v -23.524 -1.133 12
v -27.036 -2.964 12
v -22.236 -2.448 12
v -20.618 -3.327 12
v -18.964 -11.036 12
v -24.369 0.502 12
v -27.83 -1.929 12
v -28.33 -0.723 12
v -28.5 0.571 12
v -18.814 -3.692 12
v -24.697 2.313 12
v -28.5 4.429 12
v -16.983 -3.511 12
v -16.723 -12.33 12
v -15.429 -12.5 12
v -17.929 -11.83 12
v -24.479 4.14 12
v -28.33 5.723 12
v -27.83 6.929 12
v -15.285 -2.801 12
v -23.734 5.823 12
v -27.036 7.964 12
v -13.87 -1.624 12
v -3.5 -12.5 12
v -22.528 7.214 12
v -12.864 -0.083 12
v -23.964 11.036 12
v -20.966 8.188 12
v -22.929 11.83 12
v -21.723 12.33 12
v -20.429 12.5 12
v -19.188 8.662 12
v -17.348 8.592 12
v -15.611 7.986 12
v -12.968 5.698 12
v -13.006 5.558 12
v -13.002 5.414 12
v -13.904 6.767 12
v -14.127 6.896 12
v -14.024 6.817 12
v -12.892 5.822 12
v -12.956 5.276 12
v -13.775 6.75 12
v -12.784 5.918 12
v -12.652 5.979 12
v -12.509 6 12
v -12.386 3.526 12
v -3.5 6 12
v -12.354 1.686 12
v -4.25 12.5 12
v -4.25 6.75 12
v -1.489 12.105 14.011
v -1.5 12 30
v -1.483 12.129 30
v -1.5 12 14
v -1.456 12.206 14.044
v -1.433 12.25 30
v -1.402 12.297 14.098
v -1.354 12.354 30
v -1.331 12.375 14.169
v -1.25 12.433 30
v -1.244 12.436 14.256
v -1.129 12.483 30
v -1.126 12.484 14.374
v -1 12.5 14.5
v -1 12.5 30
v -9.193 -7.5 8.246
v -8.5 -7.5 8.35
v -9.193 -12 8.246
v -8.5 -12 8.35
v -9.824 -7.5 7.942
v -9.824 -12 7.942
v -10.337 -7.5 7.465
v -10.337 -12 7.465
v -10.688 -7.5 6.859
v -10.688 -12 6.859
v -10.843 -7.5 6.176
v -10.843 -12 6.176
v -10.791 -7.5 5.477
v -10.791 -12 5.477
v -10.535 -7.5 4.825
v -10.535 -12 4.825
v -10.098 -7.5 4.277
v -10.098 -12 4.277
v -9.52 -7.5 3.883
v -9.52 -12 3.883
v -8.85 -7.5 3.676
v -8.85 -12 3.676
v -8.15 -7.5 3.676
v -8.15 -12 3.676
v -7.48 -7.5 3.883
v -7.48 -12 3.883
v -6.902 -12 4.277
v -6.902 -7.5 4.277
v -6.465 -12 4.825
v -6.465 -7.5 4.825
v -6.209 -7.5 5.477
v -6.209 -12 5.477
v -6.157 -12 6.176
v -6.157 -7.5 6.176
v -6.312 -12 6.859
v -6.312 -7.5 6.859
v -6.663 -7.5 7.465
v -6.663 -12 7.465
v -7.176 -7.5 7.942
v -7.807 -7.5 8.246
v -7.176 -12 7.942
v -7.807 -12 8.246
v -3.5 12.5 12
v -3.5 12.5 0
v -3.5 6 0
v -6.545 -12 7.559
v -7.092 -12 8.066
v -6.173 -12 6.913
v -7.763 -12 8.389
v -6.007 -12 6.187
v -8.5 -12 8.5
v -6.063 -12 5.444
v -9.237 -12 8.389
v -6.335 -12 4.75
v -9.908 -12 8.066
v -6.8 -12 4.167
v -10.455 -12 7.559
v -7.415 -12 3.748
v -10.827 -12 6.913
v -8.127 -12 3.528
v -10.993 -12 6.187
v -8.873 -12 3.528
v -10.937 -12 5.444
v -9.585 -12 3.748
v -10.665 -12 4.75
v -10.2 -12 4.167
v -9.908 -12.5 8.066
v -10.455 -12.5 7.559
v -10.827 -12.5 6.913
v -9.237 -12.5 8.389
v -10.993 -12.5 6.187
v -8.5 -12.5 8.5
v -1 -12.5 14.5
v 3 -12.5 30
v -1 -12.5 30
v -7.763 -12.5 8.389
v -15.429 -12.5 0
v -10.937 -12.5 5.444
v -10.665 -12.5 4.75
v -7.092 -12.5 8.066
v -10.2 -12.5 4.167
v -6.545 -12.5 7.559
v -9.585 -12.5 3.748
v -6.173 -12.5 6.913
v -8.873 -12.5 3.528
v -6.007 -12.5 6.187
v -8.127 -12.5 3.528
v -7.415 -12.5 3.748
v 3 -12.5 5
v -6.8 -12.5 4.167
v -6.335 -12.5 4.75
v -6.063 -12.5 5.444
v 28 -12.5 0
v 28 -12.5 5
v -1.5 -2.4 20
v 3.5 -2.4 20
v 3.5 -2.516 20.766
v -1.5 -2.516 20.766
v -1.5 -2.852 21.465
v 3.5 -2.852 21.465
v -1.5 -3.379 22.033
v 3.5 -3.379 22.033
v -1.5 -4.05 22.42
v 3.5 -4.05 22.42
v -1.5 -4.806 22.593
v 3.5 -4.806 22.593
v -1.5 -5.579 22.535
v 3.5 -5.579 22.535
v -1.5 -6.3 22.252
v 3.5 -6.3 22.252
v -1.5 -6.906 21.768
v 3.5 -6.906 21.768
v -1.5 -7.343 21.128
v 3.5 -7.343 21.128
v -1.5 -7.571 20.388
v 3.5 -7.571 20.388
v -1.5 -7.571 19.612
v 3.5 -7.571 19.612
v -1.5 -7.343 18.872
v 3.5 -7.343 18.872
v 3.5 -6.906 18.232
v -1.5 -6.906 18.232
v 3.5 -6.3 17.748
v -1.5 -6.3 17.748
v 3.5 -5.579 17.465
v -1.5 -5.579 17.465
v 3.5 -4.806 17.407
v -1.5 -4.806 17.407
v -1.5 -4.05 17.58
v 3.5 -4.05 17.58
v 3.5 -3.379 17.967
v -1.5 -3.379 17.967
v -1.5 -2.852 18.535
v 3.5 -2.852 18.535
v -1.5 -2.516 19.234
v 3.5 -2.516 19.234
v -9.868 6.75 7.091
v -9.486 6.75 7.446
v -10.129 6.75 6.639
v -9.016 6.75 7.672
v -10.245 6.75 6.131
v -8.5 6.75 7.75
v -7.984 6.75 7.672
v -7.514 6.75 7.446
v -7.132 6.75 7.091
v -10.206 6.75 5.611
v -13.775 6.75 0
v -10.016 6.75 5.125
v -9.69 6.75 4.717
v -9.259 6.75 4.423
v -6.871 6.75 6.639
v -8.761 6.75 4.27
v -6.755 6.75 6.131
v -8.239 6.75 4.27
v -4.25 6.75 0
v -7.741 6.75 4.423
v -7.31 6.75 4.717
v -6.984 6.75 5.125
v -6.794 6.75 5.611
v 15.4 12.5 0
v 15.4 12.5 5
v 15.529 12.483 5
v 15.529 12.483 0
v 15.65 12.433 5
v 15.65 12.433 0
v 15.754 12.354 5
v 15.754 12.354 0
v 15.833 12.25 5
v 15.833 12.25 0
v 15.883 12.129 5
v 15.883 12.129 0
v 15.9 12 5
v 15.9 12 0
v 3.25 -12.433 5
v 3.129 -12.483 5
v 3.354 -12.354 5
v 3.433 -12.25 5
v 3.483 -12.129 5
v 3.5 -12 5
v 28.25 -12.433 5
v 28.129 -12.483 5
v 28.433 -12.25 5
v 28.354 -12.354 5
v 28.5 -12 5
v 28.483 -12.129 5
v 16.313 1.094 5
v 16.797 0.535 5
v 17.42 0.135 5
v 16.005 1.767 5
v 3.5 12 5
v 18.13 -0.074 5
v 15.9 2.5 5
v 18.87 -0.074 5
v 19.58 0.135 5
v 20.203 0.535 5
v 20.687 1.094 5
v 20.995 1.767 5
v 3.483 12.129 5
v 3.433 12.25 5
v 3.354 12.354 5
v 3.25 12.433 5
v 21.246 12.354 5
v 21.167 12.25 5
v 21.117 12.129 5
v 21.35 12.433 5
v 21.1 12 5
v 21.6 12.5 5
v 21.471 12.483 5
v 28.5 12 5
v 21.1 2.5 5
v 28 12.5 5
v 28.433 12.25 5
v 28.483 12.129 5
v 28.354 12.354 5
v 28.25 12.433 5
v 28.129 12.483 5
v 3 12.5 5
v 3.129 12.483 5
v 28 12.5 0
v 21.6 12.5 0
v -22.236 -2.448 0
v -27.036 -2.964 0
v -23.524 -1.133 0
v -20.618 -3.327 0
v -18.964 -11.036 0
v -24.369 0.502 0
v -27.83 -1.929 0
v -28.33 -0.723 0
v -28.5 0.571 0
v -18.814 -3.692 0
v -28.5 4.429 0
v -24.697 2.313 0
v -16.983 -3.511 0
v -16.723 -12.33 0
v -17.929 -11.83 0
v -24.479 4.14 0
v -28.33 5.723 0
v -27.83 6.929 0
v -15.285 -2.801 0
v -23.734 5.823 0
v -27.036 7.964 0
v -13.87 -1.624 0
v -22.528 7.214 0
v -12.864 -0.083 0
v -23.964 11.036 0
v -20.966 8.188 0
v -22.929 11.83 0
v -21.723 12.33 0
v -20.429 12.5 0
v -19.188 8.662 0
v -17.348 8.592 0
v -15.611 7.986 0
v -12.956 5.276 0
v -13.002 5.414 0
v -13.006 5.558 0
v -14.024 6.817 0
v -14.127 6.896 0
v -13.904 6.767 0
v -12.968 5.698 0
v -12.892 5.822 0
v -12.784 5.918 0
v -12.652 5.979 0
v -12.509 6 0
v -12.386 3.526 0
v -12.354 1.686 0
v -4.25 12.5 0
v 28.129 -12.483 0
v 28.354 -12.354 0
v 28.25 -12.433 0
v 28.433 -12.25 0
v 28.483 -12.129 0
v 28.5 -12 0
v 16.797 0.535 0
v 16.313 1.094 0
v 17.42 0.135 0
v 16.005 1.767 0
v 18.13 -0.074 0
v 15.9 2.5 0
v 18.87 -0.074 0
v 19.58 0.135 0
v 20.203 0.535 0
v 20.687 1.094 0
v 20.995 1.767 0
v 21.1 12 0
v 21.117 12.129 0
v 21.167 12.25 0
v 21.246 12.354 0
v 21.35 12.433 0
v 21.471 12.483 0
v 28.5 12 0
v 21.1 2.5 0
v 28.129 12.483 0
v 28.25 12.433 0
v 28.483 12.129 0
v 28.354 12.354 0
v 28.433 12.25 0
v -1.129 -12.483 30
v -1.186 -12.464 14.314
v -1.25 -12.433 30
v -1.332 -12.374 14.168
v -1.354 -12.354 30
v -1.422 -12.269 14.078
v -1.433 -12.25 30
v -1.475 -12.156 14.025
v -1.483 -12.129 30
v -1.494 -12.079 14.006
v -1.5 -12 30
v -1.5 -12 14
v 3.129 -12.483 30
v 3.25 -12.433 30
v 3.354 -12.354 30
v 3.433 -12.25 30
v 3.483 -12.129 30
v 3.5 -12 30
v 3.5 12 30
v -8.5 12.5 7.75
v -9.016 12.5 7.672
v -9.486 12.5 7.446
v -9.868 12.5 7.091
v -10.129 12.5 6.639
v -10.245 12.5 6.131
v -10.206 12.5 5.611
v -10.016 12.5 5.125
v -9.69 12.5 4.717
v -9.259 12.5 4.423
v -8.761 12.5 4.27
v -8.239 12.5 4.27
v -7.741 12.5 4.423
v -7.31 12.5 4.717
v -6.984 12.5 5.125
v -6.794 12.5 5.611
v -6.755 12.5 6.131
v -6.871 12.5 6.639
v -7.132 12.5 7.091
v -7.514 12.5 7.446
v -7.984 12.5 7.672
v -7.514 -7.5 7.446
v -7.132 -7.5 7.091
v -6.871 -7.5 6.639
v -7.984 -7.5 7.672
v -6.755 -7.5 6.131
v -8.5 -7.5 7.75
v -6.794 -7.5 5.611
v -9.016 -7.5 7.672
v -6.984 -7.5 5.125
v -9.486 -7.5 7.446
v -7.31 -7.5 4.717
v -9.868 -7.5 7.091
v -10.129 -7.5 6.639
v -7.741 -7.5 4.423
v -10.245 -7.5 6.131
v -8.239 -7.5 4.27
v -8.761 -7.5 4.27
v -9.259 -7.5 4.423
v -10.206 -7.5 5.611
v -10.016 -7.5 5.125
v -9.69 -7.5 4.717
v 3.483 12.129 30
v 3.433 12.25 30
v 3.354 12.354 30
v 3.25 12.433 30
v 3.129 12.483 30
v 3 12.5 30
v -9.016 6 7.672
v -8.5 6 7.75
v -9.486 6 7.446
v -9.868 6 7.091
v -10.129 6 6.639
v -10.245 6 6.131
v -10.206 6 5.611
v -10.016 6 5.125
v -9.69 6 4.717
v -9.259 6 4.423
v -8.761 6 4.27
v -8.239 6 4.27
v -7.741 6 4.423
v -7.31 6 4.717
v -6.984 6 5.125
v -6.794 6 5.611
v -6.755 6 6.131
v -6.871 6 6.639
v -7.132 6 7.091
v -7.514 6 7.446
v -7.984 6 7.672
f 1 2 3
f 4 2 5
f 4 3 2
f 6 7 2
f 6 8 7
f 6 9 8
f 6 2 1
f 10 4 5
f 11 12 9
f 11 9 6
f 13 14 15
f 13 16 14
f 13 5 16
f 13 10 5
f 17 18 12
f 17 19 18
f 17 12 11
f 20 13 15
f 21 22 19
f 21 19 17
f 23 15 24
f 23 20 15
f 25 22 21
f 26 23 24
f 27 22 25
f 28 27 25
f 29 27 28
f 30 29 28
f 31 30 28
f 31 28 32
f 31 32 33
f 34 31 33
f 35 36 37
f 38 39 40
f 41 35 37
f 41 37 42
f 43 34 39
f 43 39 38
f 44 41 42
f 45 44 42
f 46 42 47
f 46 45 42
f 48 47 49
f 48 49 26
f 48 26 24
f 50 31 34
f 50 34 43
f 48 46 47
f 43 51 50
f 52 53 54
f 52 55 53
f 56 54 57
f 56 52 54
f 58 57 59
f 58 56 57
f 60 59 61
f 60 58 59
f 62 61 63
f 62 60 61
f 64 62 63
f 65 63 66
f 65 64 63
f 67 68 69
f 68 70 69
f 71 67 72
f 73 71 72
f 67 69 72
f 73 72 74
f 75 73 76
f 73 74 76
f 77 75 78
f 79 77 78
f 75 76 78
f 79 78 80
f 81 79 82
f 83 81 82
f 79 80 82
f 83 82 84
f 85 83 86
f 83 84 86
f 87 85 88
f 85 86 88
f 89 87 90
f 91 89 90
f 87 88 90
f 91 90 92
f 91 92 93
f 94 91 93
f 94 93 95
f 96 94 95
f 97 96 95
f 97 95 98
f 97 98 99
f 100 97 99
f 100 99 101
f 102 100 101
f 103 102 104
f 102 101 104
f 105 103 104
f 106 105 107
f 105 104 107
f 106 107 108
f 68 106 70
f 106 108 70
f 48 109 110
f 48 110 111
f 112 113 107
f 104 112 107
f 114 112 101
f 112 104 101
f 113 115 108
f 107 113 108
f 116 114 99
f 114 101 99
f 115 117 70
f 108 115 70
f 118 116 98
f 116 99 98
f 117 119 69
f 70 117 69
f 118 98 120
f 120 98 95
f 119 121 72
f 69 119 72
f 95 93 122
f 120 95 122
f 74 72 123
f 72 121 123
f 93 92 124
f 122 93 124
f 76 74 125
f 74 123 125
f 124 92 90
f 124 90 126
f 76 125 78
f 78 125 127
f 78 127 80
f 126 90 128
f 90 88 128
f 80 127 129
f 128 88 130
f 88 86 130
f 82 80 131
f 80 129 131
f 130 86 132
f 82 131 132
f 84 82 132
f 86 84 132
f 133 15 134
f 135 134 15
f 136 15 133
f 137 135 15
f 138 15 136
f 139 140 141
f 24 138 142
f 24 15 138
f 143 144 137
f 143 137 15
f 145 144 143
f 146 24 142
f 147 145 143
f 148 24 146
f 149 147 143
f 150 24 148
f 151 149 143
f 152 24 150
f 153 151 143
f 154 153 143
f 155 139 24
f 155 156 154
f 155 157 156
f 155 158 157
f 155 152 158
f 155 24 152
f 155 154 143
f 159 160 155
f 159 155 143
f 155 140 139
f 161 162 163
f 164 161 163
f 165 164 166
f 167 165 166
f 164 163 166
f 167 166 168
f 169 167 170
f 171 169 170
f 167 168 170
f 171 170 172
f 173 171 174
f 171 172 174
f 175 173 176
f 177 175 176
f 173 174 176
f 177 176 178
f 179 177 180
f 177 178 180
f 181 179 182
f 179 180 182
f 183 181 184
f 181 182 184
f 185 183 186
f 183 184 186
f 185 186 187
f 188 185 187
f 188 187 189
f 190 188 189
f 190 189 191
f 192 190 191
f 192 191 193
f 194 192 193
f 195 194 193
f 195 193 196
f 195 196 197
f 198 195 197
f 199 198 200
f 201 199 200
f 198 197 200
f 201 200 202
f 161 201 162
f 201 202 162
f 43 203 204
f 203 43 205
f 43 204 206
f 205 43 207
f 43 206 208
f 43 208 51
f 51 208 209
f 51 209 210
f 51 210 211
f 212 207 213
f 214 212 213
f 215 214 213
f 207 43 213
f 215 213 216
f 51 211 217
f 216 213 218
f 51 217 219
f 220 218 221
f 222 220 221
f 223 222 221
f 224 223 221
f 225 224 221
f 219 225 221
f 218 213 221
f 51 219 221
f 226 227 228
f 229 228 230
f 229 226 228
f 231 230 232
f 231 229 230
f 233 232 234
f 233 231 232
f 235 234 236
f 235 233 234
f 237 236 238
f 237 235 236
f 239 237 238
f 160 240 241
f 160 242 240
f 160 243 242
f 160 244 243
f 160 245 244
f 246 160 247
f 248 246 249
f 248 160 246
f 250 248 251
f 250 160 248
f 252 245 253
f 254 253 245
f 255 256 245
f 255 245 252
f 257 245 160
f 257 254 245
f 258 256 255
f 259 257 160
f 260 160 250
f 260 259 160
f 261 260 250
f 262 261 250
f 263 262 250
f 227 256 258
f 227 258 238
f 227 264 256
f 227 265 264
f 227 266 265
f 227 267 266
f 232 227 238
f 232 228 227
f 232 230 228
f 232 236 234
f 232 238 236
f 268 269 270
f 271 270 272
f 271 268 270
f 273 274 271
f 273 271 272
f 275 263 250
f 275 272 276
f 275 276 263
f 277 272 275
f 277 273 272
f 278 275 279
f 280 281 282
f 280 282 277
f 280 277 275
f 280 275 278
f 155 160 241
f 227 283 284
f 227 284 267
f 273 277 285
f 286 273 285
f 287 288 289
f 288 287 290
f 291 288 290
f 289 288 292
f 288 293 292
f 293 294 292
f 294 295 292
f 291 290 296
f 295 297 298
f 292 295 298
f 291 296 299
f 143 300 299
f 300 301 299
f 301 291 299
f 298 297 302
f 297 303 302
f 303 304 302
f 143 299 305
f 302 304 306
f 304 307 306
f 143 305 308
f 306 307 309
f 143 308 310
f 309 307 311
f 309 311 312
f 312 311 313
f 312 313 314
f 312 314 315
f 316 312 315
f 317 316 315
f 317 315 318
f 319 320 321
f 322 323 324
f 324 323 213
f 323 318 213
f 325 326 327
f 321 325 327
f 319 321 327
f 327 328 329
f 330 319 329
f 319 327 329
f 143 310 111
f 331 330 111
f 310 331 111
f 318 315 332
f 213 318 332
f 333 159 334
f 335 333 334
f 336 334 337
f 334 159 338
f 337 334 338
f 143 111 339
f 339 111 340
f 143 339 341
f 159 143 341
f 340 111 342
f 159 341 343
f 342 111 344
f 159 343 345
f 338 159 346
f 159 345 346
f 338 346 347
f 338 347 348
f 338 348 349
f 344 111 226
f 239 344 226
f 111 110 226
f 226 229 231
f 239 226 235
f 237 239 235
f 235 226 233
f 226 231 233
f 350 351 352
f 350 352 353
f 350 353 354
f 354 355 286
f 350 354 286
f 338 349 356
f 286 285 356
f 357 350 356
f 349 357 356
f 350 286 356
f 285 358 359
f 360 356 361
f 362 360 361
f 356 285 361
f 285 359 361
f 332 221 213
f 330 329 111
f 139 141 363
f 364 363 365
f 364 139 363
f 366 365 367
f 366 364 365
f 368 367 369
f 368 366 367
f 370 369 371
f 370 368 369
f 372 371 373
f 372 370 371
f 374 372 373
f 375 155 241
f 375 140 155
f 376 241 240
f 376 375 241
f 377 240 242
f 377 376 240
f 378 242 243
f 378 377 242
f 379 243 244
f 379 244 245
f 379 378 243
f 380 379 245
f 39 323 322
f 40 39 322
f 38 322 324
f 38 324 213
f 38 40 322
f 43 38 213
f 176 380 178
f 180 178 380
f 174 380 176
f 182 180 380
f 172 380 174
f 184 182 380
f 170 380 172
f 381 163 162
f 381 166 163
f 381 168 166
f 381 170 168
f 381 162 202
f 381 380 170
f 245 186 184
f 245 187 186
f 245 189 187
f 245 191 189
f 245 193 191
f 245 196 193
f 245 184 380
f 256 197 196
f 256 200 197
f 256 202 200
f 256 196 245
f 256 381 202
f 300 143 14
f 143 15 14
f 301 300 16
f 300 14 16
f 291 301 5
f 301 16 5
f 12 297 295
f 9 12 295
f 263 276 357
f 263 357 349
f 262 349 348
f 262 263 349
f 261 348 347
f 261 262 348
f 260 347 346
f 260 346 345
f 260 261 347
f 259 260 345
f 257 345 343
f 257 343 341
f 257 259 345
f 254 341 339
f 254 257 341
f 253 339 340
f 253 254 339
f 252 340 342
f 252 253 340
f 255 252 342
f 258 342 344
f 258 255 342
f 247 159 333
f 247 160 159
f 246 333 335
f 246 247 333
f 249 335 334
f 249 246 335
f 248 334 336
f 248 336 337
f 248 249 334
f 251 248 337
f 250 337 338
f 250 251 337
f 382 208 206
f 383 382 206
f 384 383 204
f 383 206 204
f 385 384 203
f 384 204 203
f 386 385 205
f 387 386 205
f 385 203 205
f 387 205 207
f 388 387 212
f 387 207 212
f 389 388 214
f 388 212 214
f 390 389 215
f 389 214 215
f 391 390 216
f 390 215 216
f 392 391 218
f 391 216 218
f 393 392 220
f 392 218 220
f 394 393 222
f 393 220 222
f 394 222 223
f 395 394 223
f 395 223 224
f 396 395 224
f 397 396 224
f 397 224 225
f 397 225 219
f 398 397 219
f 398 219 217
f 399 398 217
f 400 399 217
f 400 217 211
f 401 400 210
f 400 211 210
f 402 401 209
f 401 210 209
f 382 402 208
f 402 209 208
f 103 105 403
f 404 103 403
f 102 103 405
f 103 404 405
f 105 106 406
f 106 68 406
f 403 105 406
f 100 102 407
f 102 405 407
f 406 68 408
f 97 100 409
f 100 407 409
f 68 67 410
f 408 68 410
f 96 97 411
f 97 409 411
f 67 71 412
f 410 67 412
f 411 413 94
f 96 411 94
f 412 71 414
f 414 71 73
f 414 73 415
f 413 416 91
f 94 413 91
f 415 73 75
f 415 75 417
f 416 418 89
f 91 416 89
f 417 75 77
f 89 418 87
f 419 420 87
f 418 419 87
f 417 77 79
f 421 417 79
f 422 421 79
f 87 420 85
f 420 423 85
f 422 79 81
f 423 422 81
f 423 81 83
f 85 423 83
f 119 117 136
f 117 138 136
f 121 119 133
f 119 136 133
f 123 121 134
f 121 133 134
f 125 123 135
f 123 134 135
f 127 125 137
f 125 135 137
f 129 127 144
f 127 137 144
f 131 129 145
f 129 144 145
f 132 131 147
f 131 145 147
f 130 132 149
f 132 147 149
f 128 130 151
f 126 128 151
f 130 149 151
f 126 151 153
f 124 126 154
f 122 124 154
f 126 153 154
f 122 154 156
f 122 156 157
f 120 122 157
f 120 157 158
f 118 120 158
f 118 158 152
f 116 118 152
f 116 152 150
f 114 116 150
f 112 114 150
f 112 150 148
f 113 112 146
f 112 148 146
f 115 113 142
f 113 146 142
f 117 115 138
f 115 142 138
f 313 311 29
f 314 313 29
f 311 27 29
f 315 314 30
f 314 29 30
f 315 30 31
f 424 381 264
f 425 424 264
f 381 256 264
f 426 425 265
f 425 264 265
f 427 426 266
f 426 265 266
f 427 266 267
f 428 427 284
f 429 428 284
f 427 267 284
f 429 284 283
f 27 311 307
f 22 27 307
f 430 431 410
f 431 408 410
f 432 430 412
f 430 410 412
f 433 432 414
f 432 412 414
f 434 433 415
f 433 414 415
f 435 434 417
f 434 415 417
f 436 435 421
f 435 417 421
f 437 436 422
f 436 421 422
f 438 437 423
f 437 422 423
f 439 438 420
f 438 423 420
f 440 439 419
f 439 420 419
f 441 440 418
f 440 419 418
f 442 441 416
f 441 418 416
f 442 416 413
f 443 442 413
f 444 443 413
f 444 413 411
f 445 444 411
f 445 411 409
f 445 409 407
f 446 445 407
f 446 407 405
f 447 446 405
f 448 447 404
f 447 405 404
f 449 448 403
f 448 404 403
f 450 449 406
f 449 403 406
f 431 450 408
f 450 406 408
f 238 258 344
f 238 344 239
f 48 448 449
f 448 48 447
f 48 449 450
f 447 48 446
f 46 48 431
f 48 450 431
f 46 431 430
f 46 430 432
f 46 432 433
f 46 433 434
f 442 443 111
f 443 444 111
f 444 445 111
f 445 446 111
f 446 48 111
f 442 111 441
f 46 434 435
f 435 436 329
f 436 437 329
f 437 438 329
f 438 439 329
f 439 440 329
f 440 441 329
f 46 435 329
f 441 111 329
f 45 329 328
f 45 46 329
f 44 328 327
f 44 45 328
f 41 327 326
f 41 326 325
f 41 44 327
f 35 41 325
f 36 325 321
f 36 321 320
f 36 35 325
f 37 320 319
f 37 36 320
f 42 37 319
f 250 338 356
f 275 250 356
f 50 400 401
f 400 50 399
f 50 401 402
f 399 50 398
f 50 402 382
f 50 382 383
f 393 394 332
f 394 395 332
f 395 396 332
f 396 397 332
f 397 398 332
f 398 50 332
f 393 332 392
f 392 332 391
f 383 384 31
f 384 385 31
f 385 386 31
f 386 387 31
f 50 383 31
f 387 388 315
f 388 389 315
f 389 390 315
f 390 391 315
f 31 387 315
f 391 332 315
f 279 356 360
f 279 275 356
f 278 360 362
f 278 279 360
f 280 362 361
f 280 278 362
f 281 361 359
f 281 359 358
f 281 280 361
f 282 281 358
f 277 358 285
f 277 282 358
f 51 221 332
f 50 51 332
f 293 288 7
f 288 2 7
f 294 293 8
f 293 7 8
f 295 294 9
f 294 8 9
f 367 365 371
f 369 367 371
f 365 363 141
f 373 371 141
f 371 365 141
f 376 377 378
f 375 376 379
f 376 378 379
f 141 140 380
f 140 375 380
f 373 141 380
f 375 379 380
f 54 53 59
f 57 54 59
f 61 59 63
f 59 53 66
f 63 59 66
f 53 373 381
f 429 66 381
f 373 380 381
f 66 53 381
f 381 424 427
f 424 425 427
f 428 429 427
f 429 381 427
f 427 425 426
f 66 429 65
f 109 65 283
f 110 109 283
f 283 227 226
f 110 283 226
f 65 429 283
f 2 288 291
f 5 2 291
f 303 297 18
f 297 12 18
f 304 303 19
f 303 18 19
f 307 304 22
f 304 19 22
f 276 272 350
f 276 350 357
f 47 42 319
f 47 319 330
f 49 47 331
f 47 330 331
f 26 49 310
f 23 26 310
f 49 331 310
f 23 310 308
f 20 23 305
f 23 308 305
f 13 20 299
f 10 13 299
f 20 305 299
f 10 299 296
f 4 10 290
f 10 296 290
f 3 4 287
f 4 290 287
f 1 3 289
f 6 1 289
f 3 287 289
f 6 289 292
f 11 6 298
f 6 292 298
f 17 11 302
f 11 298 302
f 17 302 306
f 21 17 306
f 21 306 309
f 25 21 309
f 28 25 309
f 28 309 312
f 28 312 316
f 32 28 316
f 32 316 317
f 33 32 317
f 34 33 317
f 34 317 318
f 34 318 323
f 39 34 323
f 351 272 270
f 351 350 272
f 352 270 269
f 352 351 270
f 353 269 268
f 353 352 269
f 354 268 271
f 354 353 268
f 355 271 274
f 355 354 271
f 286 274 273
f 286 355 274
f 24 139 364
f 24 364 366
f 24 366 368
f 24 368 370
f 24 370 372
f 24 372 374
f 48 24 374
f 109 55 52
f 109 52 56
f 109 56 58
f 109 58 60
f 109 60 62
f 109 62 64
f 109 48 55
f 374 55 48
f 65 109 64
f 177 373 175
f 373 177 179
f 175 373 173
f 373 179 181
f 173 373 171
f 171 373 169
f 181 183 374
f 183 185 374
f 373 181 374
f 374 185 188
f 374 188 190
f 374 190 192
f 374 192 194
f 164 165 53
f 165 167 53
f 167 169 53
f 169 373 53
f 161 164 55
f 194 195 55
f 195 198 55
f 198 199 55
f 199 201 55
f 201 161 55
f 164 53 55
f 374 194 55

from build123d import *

# Parameters (mm, degrees)
BOSS_EXTRUDE1_DEPTH = 12
SKETCH3_W           = 25
SKETCH3_H           = 25
CUT_EXTRUDE1_DEPTH  = 7
SKETCH4_W           = 18
SKETCH4_H           = 25
SKETCH4_R           = 2.6
BOSS_EXTRUDE2_DEPTH = 5
CHAMFER1_SIZE       = 2
CUT_EXTRUDE2_DEPTH  = 5
FILLET1_R           = 5
FILLET2_R           = 0.5


with BuildPart() as part:
    # Sketch1 → Boss-Extrude1 (new body)
    with BuildSketch(Plane.XY):
        with BuildLine():
            Line((-22.5, 12.5), (-28.5, 6.5))
            Line((-28.5, 6.5), (-28.5, -1.5))
            Line((-28.5, -1.5), (-17.5, -12.5))
            Line((-17.5, -12.5), (28.5, -12.5))
            Line((28.5, -12.5), (28.5, 12.5))
            Line((28.5, 12.5), (-3.5, 12.5))
            Line((-3.5, 12.5), (-3.5, 6))
            Line((-3.5, 6), (-13.382383367, 6))
            ThreePointArc((-13.382383367, 6), (-23.330458604, -1.386729946), (-13.985855563, 6.75))
            Line((-13.985855563, 6.75), (-4.25, 6.75))
            Line((-4.25, 6.75), (-4.25, 12.5))
            Line((-4.25, 12.5), (-5.7, 12.5))
            Line((-5.7, 12.5), (-22.5, 12.5))
        make_face()
    extrude(amount=BOSS_EXTRUDE1_DEPTH)

    # Sketch3 → Cut-Extrude1 (cut)
    with BuildSketch(Plane.XY.offset(12)):
        with Locations((16, 0)):
            Rectangle(SKETCH3_W, SKETCH3_H)
    extrude(amount=-CUT_EXTRUDE1_DEPTH, mode=Mode.SUBTRACT)

    # Sketch4 → Boss-Extrude2 (add)
    with BuildSketch(Plane(origin=(3.5, 0, 0), x_dir=(0, 0, -1), z_dir=(1, 0, 0))):
        with Locations((-21, 0)):
            Rectangle(SKETCH4_W, SKETCH4_H)
        with Locations(Location((-20, -5, 0), (0, 0, 90))):
            Circle(SKETCH4_R, mode=Mode.SUBTRACT)
    extrude(amount=-BOSS_EXTRUDE2_DEPTH)

    # Chamfer1
    chamfer1_edges = [part.edges().sort_by_distance(p)[0] for p in [
        (-1.5, 0, 12),
    ]]
    chamfer(chamfer1_edges, length=CHAMFER1_SIZE)

    # Sketch5 → Cut-Extrude2 (cut)
    with BuildSketch(Plane.XY.offset(5)):
        with BuildLine():
            Line((15.9, 2.5), (15.9, 12.5))
            Line((15.9, 12.5), (21.1, 12.5))
            Line((21.1, 12.5), (21.1, 2.5))
            ThreePointArc((21.1, 2.5), (18.5, -0.1), (15.9, 2.5))
        make_face()
    extrude(amount=-CUT_EXTRUDE2_DEPTH, mode=Mode.SUBTRACT)

    # Fillet1
    fillet1_edges = [part.edges().sort_by_distance(p)[0] for p in [
        (-17.5, -12.5, 6),
        (-28.5, -1.5, 6),
        (-28.5, 6.5, 6),
        (-22.5, 12.5, 6),
    ]]
    fillet(fillet1_edges, radius=FILLET1_R)

    # Fillet2
    fillet2_edges = [part.edges().sort_by_distance(p)[0] for p in [
        (-13.985855563, 6.75, 6),
        (-13.382383367, 6, 6),
        (28.5, 12.5, 2.5),
        (28.5, -12.5, 2.5),
        (3.5, -12.5, 17.5),
        (3.5, 12.5, 17.5),
        (-1.5, -12.5, 22),
        (-1.5, 12.5, 22),
        (15.9, 12.5, 2.5),
        (21.1, 12.5, 2.5),
    ]]
    fillet(fillet2_edges, radius=FILLET2_R)

    # Sketch6 → Cut-Revolve1 (revolve, cut)
    with BuildSketch(Plane(origin=(0, 0, 6), x_dir=(-1, 0, 0), z_dir=(0, 0, -1)), mode=Mode.PRIVATE) as cut_revolve1_sk:
        Polygon((8.5, 12.5), (10.25, 12.5), (10.25, -7.5), (10.85, -7.5), (10.85, -12), (11, -12), (11, -12.5), (8.5, -12.5), align=None)
    revolve(cut_revolve1_sk.sketch.rotate(Axis((-8.5, 12.5, 6), (0, -1, 0)), 270), axis=Axis((-8.5, 12.5, 6), (0, -1, 0)), mode=Mode.SUBTRACT)


solid = part.part
